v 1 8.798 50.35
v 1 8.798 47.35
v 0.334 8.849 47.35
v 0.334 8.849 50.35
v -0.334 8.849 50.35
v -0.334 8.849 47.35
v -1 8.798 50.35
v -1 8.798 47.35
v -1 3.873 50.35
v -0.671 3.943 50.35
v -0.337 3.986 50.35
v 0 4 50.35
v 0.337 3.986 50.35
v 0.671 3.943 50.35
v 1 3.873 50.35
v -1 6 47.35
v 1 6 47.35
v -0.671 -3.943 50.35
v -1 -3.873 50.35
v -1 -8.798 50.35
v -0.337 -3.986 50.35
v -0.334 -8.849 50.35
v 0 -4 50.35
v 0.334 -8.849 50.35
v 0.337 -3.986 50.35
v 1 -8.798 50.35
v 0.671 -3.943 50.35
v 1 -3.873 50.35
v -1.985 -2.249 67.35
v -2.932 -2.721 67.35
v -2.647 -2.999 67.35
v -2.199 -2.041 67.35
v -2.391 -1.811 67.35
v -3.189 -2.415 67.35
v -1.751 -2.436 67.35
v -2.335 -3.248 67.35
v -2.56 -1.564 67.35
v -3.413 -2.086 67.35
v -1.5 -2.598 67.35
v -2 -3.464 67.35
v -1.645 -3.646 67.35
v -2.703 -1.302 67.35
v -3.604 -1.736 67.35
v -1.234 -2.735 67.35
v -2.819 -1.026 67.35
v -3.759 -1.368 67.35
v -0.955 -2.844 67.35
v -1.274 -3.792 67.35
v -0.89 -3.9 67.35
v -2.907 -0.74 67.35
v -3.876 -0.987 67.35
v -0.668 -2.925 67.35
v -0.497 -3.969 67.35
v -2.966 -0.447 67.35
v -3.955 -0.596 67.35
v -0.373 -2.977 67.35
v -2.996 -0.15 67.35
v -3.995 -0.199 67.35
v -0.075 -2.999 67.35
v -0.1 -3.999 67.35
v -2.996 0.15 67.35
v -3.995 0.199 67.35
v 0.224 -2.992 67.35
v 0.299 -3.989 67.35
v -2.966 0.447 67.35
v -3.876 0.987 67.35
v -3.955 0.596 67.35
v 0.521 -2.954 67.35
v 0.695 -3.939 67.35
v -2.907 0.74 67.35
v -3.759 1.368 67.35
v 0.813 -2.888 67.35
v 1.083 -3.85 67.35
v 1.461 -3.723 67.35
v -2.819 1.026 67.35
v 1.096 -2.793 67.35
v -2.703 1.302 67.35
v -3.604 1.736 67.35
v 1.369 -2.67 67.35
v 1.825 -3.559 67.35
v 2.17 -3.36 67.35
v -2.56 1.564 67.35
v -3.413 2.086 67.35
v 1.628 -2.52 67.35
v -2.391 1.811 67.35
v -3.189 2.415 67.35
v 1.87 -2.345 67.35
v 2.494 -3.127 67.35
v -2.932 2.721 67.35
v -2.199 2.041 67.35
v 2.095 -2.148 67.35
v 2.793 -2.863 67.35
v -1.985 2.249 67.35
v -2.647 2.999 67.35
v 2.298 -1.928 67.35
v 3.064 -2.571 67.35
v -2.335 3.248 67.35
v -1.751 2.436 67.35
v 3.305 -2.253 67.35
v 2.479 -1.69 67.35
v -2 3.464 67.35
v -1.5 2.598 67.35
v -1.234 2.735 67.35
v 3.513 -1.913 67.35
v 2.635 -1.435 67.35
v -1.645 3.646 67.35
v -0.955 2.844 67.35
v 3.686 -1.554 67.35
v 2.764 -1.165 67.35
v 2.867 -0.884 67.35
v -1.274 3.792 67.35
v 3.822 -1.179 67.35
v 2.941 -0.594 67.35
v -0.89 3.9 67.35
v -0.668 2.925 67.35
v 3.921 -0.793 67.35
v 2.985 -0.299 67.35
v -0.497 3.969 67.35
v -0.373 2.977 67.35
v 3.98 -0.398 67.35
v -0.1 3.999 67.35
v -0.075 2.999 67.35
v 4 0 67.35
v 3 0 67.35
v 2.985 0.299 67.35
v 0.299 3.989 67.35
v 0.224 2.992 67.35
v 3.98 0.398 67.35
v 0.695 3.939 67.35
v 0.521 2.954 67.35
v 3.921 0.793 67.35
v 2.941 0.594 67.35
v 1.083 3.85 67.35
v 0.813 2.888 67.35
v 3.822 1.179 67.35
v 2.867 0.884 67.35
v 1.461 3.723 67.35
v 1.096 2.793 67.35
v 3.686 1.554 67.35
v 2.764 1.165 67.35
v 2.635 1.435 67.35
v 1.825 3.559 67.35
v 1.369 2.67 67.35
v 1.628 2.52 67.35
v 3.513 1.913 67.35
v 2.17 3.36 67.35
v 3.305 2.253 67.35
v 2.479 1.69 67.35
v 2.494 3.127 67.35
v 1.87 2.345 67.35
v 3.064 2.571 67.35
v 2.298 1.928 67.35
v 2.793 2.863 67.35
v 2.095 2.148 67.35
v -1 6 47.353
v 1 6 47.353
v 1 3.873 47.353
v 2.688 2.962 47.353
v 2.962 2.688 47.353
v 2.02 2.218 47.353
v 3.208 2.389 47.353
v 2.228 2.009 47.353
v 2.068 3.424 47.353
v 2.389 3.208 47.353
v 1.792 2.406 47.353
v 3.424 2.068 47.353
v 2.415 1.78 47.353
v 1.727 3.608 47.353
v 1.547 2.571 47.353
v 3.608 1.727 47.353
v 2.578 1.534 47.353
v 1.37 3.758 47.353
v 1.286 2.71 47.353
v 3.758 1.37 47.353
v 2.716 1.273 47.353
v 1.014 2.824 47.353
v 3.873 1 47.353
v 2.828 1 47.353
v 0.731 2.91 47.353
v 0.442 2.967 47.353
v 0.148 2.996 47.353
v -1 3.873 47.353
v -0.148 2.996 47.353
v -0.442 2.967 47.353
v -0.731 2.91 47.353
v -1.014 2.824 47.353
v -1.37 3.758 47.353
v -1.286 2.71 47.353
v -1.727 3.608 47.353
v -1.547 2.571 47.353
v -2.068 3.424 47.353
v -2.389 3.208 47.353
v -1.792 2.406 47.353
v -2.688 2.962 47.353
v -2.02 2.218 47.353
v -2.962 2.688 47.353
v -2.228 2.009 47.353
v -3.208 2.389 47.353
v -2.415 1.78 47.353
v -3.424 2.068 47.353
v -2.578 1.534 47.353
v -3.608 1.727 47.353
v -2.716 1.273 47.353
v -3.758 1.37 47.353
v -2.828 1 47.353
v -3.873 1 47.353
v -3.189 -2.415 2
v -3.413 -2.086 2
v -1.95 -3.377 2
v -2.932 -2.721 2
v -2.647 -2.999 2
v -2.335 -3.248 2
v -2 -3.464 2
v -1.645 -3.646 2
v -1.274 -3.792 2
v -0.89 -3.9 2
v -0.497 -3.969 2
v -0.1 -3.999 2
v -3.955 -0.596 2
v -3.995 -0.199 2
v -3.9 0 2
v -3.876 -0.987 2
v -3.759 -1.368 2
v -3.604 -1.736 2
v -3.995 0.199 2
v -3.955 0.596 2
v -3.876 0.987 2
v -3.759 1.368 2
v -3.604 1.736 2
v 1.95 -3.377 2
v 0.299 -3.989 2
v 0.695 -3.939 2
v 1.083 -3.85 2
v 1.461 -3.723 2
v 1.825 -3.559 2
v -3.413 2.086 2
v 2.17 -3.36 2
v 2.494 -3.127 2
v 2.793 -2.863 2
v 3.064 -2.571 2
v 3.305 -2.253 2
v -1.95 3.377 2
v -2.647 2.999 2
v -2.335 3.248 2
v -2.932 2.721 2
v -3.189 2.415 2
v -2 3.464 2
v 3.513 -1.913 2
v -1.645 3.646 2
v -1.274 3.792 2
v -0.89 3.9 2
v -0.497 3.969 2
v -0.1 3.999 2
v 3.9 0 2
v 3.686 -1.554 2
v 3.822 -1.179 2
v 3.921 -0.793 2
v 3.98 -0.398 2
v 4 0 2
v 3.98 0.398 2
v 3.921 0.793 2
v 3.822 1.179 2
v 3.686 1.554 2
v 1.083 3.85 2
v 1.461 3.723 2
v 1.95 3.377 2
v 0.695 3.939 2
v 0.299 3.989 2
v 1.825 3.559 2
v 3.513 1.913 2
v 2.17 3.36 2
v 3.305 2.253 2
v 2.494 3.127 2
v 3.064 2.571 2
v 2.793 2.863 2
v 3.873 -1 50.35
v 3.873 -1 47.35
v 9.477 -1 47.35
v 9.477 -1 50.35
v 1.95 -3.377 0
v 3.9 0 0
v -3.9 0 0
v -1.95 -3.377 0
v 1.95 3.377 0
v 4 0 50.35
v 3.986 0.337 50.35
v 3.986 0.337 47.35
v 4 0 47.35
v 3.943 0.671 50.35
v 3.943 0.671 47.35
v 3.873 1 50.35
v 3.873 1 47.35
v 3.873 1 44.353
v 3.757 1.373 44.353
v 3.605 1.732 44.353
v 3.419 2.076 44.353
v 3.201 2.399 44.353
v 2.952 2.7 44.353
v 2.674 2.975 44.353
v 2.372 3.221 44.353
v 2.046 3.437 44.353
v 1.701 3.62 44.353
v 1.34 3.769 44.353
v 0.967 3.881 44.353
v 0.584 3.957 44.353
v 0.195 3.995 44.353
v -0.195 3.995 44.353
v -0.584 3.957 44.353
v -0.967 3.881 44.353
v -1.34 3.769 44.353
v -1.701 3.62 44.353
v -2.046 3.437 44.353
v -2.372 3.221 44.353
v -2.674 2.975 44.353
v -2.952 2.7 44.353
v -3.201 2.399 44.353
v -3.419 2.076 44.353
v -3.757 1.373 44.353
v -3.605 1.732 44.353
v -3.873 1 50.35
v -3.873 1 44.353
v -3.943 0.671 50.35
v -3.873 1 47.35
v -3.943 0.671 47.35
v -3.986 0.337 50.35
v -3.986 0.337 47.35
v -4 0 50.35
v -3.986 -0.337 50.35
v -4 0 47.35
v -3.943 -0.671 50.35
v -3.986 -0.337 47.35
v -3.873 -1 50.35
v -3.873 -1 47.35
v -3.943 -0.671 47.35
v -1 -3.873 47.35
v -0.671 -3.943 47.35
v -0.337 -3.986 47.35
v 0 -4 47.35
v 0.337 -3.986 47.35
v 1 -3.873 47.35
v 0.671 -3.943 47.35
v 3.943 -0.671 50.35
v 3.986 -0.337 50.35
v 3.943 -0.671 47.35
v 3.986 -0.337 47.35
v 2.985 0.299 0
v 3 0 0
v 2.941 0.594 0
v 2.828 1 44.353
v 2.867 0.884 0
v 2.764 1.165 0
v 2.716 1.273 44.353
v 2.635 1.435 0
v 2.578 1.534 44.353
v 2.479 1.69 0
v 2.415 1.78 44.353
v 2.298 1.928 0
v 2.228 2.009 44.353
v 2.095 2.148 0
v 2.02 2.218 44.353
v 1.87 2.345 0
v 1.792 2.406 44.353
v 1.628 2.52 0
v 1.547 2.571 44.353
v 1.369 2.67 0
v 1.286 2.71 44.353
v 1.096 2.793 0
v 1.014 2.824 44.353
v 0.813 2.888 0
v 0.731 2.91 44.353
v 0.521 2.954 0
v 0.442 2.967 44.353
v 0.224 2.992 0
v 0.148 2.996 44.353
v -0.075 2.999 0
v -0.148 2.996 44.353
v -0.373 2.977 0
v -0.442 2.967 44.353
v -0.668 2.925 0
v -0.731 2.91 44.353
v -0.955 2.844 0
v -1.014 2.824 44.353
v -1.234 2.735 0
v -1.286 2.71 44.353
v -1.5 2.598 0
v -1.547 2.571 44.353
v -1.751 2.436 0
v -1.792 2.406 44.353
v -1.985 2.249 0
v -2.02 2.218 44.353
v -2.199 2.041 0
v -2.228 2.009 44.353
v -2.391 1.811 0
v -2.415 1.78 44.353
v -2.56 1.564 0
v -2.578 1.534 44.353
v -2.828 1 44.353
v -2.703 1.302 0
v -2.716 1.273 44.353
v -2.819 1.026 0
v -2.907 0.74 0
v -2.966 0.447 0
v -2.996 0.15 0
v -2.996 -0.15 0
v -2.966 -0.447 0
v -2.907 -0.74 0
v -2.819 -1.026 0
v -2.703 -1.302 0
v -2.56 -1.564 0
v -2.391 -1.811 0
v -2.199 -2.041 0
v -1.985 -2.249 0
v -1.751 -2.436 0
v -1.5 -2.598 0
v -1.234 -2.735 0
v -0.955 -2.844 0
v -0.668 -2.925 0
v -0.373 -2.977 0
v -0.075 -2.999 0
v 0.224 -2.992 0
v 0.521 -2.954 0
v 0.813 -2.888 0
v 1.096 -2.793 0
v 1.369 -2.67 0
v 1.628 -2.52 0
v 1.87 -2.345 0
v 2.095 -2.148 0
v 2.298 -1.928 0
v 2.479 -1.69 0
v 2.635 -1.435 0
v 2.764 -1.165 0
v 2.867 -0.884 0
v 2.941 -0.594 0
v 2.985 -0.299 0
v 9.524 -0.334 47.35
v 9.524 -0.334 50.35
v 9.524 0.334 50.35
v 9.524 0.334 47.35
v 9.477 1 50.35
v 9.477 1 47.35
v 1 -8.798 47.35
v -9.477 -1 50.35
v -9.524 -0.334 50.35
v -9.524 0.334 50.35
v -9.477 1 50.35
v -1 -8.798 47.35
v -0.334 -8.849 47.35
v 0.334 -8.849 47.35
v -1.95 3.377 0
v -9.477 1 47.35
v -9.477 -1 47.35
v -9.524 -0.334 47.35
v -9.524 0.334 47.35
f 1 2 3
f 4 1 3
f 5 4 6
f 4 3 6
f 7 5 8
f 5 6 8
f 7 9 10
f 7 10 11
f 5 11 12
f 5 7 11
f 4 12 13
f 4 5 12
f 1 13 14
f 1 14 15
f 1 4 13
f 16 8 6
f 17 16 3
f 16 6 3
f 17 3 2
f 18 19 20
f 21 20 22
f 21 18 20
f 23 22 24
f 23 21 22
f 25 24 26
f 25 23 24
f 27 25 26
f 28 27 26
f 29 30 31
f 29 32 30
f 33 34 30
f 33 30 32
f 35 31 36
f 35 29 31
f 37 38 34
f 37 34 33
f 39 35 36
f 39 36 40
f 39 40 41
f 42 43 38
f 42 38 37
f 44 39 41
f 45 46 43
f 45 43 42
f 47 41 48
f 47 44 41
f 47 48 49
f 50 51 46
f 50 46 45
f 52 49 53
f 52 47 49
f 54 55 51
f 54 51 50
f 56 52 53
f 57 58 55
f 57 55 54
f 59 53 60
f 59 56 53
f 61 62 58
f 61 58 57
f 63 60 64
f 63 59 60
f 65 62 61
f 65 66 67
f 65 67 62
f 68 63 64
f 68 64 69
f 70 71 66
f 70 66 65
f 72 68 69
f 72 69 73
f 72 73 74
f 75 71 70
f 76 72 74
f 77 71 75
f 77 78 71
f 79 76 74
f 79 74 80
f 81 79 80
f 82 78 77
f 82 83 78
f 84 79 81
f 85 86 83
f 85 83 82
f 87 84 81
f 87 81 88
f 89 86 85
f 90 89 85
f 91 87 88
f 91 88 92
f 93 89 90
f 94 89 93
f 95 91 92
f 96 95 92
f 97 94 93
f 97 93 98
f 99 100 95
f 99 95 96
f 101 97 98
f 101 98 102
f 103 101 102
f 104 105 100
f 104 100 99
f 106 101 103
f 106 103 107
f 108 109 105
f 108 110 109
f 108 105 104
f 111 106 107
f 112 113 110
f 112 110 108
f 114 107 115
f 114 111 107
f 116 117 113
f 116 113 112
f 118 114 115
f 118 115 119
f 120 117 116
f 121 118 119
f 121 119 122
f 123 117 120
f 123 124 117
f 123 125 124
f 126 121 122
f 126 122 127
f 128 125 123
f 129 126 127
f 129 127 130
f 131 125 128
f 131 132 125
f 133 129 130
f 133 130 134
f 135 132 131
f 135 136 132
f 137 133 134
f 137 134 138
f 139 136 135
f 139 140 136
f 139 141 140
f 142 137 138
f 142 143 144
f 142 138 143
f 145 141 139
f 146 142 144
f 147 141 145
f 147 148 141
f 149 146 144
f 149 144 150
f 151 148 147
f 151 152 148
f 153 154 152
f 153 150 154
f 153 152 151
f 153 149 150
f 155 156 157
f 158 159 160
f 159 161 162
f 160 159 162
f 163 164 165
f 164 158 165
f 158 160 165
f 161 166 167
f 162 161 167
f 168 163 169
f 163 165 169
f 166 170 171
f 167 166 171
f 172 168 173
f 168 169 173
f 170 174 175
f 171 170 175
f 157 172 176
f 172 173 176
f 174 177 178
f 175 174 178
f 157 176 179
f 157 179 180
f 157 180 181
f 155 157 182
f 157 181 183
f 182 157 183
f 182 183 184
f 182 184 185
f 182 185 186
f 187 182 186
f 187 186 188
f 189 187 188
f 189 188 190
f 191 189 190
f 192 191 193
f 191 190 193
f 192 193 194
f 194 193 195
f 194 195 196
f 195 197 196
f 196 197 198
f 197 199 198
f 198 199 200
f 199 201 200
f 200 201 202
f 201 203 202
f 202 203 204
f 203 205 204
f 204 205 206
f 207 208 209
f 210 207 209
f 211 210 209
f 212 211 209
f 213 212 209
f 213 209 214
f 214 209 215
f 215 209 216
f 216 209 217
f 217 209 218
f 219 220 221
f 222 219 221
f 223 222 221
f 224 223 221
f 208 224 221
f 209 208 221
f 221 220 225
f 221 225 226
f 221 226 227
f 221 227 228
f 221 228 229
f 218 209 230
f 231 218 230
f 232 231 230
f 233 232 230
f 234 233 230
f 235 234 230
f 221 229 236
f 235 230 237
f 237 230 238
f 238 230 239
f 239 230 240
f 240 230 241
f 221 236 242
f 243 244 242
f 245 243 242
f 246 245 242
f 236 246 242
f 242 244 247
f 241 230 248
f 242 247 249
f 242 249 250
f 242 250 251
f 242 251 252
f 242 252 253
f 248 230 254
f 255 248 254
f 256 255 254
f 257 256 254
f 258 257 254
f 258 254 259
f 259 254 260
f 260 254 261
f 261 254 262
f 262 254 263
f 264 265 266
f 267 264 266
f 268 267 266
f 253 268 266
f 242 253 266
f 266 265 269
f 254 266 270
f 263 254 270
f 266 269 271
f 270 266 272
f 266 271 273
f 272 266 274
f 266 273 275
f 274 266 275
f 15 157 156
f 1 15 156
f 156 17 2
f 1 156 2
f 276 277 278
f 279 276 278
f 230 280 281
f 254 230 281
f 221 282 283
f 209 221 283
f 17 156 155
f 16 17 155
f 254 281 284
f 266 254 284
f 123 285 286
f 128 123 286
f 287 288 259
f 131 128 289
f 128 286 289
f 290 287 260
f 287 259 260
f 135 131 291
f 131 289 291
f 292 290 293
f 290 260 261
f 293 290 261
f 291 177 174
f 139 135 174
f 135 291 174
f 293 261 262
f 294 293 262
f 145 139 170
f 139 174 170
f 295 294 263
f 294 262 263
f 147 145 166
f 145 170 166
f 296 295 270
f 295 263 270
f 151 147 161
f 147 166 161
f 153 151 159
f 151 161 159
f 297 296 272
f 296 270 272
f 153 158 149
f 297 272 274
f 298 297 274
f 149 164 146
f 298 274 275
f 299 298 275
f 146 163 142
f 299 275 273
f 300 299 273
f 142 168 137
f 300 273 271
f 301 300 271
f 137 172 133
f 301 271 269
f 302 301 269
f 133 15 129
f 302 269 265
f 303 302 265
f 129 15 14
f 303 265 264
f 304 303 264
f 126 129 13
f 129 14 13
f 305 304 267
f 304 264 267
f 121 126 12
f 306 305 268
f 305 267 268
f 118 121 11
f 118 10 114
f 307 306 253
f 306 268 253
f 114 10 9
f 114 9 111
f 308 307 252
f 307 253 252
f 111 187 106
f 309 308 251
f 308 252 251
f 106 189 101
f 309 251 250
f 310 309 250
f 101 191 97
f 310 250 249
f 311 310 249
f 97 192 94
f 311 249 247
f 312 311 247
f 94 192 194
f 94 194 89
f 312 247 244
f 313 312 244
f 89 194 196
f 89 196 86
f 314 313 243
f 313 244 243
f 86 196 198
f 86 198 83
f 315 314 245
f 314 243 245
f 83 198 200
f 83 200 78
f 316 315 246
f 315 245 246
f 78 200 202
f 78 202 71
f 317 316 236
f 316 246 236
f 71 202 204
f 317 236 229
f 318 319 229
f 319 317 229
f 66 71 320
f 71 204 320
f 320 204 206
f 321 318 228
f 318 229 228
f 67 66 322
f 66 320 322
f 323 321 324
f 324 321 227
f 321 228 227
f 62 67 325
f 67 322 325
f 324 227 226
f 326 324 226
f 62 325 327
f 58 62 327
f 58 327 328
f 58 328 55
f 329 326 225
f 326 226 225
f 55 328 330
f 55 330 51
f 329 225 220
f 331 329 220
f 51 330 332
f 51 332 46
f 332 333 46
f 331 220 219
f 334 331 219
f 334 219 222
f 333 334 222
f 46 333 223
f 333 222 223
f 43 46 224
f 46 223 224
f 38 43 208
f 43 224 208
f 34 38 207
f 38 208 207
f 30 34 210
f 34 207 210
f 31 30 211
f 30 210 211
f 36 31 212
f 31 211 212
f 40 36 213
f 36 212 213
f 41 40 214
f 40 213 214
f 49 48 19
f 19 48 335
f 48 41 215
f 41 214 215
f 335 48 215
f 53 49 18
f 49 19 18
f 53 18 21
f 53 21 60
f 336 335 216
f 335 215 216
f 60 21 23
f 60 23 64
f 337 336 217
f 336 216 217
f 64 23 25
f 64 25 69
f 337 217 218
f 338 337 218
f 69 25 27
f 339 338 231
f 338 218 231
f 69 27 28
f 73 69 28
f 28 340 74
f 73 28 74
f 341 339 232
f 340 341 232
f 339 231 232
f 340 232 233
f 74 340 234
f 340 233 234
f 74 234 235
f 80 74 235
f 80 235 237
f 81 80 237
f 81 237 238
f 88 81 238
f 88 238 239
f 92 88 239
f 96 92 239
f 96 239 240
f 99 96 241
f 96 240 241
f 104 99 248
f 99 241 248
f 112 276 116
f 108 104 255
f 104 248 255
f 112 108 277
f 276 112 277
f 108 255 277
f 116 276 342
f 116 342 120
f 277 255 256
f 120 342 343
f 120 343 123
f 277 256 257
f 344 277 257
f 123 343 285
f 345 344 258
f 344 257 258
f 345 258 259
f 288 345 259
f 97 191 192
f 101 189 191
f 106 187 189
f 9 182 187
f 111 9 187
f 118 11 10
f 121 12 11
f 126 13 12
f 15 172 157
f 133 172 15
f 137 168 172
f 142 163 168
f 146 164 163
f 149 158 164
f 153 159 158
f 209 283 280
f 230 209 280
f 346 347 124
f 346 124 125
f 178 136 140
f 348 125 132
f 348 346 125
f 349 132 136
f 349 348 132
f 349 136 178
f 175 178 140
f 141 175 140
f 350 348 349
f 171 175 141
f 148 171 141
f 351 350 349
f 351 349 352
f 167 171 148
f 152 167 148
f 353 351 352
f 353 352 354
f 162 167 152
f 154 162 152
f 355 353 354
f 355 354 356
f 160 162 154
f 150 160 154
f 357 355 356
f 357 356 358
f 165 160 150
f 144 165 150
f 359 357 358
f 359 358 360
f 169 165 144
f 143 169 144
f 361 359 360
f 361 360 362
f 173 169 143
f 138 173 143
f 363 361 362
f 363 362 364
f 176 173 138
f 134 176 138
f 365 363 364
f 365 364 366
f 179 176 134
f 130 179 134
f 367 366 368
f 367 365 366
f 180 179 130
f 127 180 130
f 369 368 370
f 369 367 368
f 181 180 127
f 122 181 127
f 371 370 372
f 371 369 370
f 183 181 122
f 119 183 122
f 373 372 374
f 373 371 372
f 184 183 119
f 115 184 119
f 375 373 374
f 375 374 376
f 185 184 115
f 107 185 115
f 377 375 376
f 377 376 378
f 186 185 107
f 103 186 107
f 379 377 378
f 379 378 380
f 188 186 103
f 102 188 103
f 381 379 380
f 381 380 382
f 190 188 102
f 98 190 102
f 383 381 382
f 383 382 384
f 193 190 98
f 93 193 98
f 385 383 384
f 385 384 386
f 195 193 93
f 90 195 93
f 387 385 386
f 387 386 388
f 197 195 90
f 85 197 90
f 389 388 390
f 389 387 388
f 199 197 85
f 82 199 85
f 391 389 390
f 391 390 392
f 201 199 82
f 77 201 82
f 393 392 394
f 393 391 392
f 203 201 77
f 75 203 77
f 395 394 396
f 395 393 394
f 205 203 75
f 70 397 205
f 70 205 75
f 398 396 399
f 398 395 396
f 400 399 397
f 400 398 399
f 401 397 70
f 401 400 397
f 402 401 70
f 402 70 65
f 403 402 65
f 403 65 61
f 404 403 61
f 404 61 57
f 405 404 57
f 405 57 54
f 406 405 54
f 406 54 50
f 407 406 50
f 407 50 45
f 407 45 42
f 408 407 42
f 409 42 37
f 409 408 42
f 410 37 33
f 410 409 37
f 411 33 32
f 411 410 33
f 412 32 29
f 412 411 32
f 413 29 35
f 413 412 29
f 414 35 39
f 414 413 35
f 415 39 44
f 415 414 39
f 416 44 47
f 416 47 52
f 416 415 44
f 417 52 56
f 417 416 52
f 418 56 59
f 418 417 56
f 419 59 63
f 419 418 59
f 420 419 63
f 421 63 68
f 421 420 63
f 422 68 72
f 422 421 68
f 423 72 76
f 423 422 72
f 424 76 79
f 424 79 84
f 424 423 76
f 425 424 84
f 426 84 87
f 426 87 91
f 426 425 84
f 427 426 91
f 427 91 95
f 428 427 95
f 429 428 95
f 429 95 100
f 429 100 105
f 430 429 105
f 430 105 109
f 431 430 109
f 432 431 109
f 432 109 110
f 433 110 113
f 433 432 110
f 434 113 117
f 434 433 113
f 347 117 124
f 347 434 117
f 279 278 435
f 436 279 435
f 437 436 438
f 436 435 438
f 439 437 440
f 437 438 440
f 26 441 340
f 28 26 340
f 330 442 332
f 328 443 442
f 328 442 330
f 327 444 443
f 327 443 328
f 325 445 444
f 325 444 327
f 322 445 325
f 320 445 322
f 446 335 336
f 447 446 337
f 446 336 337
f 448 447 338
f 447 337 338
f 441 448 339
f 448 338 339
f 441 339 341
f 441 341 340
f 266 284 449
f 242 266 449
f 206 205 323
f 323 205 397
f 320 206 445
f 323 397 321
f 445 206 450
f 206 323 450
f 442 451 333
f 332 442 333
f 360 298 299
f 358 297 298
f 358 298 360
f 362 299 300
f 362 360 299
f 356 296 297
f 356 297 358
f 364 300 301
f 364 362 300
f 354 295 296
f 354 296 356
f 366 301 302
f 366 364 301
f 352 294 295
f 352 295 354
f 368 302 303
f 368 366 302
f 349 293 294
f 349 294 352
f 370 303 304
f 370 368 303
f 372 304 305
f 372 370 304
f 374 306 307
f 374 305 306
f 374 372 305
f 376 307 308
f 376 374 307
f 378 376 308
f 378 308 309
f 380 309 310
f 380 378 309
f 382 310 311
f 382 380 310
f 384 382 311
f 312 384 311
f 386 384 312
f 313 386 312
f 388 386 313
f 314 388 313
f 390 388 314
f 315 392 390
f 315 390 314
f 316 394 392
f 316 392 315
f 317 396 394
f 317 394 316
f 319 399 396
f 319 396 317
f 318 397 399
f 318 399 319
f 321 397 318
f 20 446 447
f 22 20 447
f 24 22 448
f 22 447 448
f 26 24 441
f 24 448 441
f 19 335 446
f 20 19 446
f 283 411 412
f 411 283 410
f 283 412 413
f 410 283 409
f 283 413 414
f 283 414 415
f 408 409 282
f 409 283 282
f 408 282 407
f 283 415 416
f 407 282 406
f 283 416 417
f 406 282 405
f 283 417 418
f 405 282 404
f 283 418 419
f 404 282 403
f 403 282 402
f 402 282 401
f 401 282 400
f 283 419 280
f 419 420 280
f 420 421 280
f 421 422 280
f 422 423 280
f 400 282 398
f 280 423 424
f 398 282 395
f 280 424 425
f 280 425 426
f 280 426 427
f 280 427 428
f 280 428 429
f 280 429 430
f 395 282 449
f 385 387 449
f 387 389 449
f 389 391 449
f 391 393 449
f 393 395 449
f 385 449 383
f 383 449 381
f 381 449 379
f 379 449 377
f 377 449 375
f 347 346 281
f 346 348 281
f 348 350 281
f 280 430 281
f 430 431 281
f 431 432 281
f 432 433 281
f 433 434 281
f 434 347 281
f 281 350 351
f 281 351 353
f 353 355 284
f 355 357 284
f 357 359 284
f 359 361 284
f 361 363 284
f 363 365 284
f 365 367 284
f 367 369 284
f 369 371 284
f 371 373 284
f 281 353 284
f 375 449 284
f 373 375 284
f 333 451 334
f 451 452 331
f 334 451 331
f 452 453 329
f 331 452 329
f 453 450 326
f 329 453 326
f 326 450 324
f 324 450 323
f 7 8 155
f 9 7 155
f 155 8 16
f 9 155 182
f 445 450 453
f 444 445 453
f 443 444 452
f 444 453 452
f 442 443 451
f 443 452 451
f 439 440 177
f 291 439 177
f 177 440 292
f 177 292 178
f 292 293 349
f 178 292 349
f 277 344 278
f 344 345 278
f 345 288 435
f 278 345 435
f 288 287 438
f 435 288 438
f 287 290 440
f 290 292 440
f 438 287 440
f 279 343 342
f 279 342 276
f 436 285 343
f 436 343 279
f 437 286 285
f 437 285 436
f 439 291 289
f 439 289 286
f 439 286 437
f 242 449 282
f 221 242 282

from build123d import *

# Parameters (mm, degrees)
SKETCH050_R     = 3
PAD038_DEPTH    = 2
SKETCH051_R     = 4
SKETCH051_R_2   = 3
PAD039_DEPTH    = 45.35
PAD040_DEPTH    = 3
SKETCH053_R     = 4
SKETCH053_R_2   = 3
PAD041_DEPTH    = 20
SKETCH054_W     = 15
SKETCH054_H     = 3
POCKET_DEPTH    = 5
SKETCH055_R     = 3
POCKET001_DEPTH = 67.351


with BuildPart() as part:
    # Sketch050 → Pad038 (new body)
    with BuildSketch(Plane.XY):
        Polygon((1.95, 3.377499), (-1.95, 3.377499), (-3.9, 0), (-1.95, -3.377499), (1.95, -3.377499), (3.9, 0), align=None)
        Circle(SKETCH050_R, mode=Mode.SUBTRACT)
    extrude(amount=PAD038_DEPTH)

    # Sketch051 (on Face9 of Pad038) → Pad039 (join)
    with BuildSketch(Plane.XY.offset(2)):
        Circle(SKETCH051_R)
        Circle(SKETCH051_R_2, mode=Mode.SUBTRACT)
    extrude(amount=PAD039_DEPTH)

    # Sketch052 (on Face12 of Pad039) → Pad040 (join)
    with BuildSketch(Plane.XY.offset(47.35)):
        with BuildLine():
            Line((1, -8.798354), (1, -1))
            Line((1, -1), (9.477389, -1))
            ThreePointArc((9.477389, -1), (9.53, 0), (9.477389, 1))
            Line((9.477389, 1), (1, 1))
            Line((1, 1), (1, 8.798354))
            ThreePointArc((1, 8.798354), (0, 8.855), (-1, 8.798354))
            Line((-1, 8.798354), (-1, 1))
            Line((-1, 1), (-9.477389, 1))
            ThreePointArc((-9.477389, 1), (-9.53, 0), (-9.477389, -1))
            Line((-9.477389, -1), (-1, -1))
            Line((-1, -1), (-1, -8.798354))
            ThreePointArc((-1, -8.798354), (0, -8.855), (1, -8.798354))
        make_face()
    extrude(amount=PAD040_DEPTH)

    # Sketch053 (on Face19 of Pad040) → Pad041 (join)
    with BuildSketch(Plane.XY.offset(47.35)):
        Circle(SKETCH053_R)
        Circle(SKETCH053_R_2, mode=Mode.SUBTRACT)
    extrude(amount=PAD041_DEPTH)

    # Sketch054 (on Face26 of Pad041) → Pocket (cut)
    with BuildSketch(Plane(origin=(0, 1, 0), x_dir=(-1, 0, 0), z_dir=(0, 1, 0))):
        with Locations((0, 45.852941)):
            Rectangle(SKETCH054_W, SKETCH054_H)
    extrude(amount=POCKET_DEPTH, mode=Mode.SUBTRACT)

    # Sketch055 (on Face36 of Pocket) → Pocket001 (cut, through all)
    with BuildSketch(Plane.XY.offset(67.35)):
        Circle(SKETCH055_R)
    extrude(amount=-POCKET001_DEPTH, mode=Mode.SUBTRACT)


solid = part.part
